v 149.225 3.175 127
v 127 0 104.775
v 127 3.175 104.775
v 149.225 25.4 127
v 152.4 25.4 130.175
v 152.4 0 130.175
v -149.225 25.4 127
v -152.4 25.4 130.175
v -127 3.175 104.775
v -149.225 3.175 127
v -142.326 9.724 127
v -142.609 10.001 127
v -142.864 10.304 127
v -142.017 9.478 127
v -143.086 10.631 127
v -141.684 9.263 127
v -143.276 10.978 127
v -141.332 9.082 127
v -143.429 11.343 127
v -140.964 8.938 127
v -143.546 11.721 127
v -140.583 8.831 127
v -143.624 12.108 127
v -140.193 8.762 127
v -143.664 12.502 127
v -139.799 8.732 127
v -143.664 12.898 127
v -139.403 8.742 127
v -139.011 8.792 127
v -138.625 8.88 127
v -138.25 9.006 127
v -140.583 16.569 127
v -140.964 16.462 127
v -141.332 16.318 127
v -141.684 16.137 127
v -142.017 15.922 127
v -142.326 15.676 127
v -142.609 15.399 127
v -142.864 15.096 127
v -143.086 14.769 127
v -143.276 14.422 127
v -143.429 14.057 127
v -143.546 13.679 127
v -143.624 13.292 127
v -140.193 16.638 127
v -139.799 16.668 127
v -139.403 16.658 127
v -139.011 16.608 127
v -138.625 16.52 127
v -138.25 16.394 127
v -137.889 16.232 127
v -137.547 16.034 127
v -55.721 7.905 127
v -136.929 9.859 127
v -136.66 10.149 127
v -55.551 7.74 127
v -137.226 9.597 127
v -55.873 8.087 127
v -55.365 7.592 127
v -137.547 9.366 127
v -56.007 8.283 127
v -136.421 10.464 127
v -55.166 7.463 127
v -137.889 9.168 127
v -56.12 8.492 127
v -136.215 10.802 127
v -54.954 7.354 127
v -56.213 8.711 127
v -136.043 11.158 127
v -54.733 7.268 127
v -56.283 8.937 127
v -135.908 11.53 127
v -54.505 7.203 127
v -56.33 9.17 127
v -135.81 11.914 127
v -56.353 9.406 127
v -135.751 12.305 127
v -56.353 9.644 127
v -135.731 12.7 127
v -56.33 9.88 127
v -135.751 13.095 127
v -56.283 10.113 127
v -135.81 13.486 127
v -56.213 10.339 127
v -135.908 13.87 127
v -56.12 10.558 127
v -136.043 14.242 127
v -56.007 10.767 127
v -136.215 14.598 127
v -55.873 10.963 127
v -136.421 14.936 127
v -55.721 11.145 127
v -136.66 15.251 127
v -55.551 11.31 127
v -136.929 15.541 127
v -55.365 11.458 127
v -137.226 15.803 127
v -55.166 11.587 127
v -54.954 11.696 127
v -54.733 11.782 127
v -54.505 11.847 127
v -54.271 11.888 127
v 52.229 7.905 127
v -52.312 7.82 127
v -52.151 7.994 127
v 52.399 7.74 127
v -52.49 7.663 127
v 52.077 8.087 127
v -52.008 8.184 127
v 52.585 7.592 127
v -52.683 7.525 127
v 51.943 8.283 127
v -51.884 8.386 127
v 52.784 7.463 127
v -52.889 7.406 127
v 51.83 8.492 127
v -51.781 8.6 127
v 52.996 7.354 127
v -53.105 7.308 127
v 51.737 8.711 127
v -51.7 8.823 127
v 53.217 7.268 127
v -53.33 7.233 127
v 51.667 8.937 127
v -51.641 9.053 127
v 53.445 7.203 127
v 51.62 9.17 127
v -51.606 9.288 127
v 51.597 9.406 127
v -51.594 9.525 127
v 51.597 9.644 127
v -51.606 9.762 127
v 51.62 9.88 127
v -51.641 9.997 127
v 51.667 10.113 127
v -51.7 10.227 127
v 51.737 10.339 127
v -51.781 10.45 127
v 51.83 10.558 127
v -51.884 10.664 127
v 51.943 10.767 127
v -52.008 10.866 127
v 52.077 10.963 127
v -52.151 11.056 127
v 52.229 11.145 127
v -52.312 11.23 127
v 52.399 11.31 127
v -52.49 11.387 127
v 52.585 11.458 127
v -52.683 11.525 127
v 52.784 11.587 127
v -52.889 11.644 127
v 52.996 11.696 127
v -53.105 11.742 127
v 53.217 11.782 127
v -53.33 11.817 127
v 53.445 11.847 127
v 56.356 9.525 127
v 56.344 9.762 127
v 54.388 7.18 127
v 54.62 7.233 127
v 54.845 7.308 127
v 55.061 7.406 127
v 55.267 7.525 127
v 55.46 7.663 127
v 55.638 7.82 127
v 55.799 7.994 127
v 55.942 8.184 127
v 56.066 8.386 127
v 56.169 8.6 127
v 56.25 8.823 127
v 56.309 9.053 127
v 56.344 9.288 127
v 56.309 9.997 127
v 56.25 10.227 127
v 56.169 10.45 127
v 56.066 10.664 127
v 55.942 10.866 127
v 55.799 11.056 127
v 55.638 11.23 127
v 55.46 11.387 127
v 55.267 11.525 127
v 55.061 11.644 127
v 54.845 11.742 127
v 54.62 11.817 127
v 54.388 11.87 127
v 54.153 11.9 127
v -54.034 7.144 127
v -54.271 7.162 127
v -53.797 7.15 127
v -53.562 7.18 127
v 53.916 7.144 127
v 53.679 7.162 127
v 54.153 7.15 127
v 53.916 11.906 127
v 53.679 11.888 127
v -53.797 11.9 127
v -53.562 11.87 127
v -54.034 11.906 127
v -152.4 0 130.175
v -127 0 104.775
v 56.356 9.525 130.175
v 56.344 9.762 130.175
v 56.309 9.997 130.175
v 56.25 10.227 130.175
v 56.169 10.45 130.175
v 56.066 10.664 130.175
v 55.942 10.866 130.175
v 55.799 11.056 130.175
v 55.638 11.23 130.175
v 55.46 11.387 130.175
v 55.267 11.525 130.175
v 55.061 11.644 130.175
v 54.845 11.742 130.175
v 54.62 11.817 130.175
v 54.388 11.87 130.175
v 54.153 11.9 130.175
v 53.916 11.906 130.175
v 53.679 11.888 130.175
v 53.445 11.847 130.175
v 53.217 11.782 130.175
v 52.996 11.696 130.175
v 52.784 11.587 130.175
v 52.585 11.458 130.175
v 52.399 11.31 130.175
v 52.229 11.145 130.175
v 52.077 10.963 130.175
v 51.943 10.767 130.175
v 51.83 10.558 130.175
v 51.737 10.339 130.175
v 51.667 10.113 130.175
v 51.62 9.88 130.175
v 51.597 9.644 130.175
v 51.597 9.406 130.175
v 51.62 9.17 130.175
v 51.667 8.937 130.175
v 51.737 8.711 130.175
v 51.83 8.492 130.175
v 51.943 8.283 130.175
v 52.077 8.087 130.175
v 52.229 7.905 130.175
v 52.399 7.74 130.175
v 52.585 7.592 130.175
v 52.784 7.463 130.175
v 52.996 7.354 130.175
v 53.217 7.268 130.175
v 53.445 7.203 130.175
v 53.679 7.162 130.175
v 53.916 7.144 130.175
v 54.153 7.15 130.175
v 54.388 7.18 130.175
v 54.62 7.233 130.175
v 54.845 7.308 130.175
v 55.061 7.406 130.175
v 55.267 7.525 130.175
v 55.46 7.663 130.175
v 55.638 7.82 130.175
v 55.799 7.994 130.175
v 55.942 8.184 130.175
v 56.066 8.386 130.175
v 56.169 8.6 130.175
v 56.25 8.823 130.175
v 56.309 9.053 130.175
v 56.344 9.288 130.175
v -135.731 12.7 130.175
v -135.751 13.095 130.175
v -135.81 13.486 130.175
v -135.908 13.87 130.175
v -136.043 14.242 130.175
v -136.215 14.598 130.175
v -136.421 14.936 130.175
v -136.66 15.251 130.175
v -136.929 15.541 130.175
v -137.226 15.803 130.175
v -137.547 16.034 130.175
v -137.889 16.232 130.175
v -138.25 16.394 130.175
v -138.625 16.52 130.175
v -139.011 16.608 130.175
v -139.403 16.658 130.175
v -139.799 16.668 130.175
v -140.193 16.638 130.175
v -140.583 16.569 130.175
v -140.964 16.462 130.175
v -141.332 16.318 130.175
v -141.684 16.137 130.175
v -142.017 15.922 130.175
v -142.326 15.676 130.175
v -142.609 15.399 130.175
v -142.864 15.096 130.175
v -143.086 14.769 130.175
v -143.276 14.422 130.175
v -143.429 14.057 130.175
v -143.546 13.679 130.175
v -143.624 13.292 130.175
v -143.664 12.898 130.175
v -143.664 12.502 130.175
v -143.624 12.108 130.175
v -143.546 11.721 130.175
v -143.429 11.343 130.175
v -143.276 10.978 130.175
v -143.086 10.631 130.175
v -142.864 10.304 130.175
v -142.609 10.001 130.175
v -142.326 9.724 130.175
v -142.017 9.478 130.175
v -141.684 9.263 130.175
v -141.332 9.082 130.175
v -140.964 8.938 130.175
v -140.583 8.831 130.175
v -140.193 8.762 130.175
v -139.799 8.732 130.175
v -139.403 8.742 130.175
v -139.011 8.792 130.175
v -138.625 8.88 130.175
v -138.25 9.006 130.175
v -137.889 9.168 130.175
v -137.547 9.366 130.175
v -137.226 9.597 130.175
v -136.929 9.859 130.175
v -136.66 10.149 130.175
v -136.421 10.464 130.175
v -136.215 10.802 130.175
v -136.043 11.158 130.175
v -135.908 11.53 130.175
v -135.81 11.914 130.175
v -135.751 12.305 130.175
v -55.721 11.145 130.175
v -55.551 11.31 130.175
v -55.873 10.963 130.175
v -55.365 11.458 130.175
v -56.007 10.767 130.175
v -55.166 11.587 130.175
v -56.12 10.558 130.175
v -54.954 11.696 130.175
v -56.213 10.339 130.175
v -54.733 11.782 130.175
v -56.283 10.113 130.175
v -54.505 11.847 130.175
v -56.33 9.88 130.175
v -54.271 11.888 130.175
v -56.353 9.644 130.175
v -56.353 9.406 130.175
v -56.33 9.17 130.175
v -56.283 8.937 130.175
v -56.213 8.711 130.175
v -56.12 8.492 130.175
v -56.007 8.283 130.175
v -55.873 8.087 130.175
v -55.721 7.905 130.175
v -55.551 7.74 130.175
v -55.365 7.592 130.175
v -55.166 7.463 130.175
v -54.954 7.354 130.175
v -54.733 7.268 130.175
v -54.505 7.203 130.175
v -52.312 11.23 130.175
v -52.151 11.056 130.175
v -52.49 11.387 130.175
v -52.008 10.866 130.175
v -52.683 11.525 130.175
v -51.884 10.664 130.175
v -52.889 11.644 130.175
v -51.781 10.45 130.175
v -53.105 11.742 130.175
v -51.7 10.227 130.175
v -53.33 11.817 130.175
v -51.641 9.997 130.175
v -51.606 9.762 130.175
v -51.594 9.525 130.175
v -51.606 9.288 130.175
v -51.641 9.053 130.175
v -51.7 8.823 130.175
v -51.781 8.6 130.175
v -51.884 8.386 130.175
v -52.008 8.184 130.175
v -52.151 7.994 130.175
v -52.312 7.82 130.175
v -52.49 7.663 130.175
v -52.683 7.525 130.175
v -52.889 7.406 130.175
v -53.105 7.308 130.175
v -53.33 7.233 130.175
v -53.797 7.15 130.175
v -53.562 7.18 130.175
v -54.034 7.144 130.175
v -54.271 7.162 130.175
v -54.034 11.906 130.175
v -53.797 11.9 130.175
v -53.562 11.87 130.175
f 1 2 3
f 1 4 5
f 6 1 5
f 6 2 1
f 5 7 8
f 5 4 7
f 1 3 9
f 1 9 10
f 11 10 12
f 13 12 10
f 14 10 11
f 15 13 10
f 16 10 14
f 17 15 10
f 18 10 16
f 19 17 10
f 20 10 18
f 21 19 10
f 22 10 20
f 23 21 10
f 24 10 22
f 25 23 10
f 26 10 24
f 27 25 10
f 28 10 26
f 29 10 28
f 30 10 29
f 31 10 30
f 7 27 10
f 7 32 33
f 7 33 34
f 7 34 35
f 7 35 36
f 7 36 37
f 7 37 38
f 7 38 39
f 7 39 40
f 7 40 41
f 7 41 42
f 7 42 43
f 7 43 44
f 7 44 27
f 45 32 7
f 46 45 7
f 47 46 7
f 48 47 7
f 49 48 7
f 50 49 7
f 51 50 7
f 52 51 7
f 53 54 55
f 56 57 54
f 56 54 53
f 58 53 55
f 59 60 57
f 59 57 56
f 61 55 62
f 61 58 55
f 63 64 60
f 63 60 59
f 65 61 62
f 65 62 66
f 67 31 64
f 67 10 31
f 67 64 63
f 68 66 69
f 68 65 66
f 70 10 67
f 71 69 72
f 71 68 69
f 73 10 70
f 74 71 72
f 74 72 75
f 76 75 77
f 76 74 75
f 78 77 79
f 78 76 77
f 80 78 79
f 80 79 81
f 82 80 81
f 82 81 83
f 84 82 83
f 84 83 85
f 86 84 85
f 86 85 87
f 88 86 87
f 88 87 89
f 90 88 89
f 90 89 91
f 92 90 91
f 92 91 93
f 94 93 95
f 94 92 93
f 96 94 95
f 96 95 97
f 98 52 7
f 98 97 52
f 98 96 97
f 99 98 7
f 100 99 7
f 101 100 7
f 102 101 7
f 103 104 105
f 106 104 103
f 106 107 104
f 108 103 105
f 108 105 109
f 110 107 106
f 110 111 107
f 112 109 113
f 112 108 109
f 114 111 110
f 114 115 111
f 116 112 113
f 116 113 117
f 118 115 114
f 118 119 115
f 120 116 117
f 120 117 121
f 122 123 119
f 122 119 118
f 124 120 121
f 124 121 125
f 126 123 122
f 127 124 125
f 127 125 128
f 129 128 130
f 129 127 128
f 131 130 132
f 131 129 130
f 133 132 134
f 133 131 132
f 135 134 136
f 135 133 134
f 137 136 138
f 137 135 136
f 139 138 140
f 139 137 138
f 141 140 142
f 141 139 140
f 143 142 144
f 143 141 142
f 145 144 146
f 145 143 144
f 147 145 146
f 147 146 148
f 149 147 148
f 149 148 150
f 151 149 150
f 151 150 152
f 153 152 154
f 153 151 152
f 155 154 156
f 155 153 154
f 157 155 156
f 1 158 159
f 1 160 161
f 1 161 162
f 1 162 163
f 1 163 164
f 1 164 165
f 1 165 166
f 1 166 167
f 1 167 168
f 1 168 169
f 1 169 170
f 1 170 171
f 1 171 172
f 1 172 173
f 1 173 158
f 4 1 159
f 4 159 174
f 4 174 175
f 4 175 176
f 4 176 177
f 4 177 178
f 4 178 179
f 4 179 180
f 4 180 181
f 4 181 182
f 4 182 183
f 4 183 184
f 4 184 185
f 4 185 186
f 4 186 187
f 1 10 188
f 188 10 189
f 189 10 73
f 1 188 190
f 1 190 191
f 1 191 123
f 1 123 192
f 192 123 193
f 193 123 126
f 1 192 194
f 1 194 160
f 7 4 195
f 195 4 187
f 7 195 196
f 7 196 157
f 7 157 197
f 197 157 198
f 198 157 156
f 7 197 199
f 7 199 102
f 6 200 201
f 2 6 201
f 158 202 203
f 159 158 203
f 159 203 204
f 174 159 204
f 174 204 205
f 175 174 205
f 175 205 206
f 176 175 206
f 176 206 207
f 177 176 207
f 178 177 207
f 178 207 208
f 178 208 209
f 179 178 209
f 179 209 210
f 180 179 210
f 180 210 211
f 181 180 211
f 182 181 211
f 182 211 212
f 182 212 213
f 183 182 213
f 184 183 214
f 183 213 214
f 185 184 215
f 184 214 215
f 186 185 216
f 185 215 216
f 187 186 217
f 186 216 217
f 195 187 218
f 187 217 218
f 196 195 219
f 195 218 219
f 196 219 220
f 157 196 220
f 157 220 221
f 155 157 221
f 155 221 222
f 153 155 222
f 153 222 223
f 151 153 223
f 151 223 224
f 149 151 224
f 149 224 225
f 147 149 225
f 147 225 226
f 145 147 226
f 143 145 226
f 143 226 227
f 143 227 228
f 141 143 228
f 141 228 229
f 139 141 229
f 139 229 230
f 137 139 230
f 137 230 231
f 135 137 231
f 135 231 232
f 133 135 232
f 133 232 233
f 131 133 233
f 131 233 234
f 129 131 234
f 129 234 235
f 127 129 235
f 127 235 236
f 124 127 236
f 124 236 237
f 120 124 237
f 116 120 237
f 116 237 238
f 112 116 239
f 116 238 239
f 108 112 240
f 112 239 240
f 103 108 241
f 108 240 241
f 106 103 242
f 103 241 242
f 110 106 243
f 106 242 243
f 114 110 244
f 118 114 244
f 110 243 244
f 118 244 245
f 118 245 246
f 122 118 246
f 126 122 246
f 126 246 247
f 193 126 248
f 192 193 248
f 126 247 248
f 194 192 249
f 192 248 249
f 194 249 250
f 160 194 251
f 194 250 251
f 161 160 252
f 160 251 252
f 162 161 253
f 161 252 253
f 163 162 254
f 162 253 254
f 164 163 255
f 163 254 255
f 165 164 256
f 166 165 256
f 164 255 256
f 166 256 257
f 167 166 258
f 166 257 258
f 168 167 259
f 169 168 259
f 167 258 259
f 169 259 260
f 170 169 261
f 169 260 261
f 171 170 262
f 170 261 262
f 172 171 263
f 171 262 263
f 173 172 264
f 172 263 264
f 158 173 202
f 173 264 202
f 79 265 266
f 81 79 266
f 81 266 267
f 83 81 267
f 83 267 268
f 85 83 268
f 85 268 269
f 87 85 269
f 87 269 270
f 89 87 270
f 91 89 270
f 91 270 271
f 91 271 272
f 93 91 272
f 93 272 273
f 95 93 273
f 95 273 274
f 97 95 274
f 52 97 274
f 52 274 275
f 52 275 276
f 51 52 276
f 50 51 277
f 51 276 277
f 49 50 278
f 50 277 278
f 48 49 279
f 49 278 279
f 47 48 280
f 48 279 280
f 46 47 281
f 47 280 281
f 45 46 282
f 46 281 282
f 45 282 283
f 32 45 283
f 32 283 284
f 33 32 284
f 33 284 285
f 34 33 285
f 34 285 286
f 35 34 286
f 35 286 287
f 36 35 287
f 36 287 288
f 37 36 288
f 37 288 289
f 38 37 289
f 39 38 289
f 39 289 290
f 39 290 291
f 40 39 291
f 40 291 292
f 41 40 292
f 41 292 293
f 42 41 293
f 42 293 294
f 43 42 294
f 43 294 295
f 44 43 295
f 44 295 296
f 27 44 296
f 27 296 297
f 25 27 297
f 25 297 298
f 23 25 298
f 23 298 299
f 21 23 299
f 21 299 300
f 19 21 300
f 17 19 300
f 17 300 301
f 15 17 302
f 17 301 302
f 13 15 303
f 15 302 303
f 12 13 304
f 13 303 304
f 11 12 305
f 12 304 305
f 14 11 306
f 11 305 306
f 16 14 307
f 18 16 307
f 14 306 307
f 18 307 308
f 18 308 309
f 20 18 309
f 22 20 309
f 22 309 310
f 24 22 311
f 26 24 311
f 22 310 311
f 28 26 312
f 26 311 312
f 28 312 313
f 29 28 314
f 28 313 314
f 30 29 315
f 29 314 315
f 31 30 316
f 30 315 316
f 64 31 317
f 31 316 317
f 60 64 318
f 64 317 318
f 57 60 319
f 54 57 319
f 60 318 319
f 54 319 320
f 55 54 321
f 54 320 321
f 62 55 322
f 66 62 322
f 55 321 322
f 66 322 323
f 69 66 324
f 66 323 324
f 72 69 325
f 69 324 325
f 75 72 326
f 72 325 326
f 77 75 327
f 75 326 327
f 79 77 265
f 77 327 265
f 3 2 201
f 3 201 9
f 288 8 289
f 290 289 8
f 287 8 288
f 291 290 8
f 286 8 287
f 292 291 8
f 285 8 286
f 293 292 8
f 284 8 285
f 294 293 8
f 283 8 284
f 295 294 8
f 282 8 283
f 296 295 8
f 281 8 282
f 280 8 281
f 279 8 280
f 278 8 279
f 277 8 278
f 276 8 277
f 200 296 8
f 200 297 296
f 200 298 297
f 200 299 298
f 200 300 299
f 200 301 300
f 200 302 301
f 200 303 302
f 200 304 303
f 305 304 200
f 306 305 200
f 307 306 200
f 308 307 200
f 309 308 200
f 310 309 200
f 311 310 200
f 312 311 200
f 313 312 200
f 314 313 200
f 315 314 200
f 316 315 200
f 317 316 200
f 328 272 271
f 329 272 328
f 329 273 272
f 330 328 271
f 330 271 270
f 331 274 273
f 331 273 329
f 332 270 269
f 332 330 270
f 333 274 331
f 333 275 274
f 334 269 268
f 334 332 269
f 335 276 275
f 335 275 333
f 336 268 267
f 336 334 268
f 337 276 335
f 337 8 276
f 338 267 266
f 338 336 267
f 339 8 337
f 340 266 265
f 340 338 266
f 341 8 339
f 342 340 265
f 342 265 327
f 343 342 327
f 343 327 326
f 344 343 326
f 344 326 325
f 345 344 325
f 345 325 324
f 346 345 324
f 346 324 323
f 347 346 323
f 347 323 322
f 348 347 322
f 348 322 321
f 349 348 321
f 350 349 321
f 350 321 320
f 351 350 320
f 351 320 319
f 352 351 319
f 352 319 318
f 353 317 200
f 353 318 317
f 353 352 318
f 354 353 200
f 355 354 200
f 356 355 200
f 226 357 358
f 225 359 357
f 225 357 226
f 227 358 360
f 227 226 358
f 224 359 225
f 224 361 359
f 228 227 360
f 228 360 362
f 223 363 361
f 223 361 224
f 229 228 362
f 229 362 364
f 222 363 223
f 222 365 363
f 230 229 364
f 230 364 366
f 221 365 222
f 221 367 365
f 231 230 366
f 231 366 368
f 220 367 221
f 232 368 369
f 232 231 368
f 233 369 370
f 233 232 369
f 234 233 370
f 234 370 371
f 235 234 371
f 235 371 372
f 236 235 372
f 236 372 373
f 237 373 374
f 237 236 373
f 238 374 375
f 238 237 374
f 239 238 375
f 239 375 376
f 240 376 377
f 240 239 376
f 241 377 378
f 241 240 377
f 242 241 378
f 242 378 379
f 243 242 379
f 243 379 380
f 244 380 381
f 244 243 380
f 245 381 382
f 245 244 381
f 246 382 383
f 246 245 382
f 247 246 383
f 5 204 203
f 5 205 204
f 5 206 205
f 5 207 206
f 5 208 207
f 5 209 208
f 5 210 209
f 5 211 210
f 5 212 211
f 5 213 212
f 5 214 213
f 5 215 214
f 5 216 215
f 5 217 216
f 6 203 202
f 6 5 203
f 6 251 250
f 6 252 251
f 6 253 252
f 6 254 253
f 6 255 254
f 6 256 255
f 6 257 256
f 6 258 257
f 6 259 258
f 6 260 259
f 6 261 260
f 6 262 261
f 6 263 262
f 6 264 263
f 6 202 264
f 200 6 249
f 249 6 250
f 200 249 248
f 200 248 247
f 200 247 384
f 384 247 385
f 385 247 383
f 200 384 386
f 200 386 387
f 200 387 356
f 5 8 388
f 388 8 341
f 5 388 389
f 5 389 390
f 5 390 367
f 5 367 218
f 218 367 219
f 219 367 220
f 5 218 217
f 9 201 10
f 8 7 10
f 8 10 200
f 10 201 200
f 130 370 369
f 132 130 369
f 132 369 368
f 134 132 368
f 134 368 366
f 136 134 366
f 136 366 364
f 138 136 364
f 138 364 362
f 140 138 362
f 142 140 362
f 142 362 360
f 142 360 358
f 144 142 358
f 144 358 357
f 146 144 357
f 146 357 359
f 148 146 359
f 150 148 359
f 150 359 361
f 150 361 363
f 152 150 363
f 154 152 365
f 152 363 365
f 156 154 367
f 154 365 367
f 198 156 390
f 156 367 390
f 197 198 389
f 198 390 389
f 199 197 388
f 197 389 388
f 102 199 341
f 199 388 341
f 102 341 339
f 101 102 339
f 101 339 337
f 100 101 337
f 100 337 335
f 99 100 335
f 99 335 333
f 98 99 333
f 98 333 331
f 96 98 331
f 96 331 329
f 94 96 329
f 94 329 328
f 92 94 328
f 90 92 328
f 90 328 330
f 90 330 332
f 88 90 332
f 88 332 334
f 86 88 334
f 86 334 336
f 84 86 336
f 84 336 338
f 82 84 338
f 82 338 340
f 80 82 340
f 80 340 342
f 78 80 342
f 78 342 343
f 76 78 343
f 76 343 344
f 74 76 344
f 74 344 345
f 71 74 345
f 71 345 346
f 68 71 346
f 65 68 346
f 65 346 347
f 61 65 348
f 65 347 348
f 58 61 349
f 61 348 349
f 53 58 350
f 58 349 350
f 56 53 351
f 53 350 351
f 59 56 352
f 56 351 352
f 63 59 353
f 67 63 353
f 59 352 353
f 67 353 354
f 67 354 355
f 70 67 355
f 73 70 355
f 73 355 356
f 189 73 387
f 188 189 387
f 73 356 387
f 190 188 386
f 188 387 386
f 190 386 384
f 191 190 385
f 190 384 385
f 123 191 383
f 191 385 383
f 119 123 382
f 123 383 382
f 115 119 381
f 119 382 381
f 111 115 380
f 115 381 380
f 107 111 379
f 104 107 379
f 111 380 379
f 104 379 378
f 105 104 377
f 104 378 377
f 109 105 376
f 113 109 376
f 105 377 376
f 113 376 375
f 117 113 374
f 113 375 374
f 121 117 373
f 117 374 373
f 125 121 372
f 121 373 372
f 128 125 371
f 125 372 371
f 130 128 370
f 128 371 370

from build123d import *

# Parameters (mm, degrees)
PAD6966_DEPTH   = 152.4
POCKET672_DEPTH = 25.401
SKETCH7924_R    = 2.38125
SKETCH7924_R_2  = 3.96875
POCKET673_DEPTH = 25.401


with BuildPart() as part:
    # Sketch7922 → Pad6966 (new body, symmetric)
    with BuildSketch(Plane.YZ):
        Polygon((0, 0), (0, -25.4), (3.175, -25.4), (3.175, -3.175), (25.4, -3.175), (25.4, 0), align=None)
    extrude(amount=PAD6966_DEPTH, both=True)

    # Sketch7923 → Pocket672 (cut, through all)
    with BuildSketch(Plane.XZ):
        Polygon((-114.3, -38.1), (-152.4, 0), (-152.4, -38.1), align=None)
        Polygon((114.3, -38.1), (152.4, 0), (152.4, -38.1), align=None)
    extrude(amount=-POCKET672_DEPTH, mode=Mode.SUBTRACT)

    # Sketch7924 → Pocket673 (cut, through all)
    with BuildSketch(Plane.XY):
        with Locations((-53.975, 9.525)):
            Circle(SKETCH7924_R)
        with Locations((53.975, 9.525)):
            Circle(SKETCH7924_R)
        with Locations((-139.7, 12.7)):
            Circle(SKETCH7924_R_2)
    extrude(amount=-POCKET673_DEPTH, mode=Mode.SUBTRACT)


with BuildPart() as part_1:
    # Body6272 placement: moved
    add(part.part.moved(Location((0, 0, 130.175))))


solid = part_1.part
